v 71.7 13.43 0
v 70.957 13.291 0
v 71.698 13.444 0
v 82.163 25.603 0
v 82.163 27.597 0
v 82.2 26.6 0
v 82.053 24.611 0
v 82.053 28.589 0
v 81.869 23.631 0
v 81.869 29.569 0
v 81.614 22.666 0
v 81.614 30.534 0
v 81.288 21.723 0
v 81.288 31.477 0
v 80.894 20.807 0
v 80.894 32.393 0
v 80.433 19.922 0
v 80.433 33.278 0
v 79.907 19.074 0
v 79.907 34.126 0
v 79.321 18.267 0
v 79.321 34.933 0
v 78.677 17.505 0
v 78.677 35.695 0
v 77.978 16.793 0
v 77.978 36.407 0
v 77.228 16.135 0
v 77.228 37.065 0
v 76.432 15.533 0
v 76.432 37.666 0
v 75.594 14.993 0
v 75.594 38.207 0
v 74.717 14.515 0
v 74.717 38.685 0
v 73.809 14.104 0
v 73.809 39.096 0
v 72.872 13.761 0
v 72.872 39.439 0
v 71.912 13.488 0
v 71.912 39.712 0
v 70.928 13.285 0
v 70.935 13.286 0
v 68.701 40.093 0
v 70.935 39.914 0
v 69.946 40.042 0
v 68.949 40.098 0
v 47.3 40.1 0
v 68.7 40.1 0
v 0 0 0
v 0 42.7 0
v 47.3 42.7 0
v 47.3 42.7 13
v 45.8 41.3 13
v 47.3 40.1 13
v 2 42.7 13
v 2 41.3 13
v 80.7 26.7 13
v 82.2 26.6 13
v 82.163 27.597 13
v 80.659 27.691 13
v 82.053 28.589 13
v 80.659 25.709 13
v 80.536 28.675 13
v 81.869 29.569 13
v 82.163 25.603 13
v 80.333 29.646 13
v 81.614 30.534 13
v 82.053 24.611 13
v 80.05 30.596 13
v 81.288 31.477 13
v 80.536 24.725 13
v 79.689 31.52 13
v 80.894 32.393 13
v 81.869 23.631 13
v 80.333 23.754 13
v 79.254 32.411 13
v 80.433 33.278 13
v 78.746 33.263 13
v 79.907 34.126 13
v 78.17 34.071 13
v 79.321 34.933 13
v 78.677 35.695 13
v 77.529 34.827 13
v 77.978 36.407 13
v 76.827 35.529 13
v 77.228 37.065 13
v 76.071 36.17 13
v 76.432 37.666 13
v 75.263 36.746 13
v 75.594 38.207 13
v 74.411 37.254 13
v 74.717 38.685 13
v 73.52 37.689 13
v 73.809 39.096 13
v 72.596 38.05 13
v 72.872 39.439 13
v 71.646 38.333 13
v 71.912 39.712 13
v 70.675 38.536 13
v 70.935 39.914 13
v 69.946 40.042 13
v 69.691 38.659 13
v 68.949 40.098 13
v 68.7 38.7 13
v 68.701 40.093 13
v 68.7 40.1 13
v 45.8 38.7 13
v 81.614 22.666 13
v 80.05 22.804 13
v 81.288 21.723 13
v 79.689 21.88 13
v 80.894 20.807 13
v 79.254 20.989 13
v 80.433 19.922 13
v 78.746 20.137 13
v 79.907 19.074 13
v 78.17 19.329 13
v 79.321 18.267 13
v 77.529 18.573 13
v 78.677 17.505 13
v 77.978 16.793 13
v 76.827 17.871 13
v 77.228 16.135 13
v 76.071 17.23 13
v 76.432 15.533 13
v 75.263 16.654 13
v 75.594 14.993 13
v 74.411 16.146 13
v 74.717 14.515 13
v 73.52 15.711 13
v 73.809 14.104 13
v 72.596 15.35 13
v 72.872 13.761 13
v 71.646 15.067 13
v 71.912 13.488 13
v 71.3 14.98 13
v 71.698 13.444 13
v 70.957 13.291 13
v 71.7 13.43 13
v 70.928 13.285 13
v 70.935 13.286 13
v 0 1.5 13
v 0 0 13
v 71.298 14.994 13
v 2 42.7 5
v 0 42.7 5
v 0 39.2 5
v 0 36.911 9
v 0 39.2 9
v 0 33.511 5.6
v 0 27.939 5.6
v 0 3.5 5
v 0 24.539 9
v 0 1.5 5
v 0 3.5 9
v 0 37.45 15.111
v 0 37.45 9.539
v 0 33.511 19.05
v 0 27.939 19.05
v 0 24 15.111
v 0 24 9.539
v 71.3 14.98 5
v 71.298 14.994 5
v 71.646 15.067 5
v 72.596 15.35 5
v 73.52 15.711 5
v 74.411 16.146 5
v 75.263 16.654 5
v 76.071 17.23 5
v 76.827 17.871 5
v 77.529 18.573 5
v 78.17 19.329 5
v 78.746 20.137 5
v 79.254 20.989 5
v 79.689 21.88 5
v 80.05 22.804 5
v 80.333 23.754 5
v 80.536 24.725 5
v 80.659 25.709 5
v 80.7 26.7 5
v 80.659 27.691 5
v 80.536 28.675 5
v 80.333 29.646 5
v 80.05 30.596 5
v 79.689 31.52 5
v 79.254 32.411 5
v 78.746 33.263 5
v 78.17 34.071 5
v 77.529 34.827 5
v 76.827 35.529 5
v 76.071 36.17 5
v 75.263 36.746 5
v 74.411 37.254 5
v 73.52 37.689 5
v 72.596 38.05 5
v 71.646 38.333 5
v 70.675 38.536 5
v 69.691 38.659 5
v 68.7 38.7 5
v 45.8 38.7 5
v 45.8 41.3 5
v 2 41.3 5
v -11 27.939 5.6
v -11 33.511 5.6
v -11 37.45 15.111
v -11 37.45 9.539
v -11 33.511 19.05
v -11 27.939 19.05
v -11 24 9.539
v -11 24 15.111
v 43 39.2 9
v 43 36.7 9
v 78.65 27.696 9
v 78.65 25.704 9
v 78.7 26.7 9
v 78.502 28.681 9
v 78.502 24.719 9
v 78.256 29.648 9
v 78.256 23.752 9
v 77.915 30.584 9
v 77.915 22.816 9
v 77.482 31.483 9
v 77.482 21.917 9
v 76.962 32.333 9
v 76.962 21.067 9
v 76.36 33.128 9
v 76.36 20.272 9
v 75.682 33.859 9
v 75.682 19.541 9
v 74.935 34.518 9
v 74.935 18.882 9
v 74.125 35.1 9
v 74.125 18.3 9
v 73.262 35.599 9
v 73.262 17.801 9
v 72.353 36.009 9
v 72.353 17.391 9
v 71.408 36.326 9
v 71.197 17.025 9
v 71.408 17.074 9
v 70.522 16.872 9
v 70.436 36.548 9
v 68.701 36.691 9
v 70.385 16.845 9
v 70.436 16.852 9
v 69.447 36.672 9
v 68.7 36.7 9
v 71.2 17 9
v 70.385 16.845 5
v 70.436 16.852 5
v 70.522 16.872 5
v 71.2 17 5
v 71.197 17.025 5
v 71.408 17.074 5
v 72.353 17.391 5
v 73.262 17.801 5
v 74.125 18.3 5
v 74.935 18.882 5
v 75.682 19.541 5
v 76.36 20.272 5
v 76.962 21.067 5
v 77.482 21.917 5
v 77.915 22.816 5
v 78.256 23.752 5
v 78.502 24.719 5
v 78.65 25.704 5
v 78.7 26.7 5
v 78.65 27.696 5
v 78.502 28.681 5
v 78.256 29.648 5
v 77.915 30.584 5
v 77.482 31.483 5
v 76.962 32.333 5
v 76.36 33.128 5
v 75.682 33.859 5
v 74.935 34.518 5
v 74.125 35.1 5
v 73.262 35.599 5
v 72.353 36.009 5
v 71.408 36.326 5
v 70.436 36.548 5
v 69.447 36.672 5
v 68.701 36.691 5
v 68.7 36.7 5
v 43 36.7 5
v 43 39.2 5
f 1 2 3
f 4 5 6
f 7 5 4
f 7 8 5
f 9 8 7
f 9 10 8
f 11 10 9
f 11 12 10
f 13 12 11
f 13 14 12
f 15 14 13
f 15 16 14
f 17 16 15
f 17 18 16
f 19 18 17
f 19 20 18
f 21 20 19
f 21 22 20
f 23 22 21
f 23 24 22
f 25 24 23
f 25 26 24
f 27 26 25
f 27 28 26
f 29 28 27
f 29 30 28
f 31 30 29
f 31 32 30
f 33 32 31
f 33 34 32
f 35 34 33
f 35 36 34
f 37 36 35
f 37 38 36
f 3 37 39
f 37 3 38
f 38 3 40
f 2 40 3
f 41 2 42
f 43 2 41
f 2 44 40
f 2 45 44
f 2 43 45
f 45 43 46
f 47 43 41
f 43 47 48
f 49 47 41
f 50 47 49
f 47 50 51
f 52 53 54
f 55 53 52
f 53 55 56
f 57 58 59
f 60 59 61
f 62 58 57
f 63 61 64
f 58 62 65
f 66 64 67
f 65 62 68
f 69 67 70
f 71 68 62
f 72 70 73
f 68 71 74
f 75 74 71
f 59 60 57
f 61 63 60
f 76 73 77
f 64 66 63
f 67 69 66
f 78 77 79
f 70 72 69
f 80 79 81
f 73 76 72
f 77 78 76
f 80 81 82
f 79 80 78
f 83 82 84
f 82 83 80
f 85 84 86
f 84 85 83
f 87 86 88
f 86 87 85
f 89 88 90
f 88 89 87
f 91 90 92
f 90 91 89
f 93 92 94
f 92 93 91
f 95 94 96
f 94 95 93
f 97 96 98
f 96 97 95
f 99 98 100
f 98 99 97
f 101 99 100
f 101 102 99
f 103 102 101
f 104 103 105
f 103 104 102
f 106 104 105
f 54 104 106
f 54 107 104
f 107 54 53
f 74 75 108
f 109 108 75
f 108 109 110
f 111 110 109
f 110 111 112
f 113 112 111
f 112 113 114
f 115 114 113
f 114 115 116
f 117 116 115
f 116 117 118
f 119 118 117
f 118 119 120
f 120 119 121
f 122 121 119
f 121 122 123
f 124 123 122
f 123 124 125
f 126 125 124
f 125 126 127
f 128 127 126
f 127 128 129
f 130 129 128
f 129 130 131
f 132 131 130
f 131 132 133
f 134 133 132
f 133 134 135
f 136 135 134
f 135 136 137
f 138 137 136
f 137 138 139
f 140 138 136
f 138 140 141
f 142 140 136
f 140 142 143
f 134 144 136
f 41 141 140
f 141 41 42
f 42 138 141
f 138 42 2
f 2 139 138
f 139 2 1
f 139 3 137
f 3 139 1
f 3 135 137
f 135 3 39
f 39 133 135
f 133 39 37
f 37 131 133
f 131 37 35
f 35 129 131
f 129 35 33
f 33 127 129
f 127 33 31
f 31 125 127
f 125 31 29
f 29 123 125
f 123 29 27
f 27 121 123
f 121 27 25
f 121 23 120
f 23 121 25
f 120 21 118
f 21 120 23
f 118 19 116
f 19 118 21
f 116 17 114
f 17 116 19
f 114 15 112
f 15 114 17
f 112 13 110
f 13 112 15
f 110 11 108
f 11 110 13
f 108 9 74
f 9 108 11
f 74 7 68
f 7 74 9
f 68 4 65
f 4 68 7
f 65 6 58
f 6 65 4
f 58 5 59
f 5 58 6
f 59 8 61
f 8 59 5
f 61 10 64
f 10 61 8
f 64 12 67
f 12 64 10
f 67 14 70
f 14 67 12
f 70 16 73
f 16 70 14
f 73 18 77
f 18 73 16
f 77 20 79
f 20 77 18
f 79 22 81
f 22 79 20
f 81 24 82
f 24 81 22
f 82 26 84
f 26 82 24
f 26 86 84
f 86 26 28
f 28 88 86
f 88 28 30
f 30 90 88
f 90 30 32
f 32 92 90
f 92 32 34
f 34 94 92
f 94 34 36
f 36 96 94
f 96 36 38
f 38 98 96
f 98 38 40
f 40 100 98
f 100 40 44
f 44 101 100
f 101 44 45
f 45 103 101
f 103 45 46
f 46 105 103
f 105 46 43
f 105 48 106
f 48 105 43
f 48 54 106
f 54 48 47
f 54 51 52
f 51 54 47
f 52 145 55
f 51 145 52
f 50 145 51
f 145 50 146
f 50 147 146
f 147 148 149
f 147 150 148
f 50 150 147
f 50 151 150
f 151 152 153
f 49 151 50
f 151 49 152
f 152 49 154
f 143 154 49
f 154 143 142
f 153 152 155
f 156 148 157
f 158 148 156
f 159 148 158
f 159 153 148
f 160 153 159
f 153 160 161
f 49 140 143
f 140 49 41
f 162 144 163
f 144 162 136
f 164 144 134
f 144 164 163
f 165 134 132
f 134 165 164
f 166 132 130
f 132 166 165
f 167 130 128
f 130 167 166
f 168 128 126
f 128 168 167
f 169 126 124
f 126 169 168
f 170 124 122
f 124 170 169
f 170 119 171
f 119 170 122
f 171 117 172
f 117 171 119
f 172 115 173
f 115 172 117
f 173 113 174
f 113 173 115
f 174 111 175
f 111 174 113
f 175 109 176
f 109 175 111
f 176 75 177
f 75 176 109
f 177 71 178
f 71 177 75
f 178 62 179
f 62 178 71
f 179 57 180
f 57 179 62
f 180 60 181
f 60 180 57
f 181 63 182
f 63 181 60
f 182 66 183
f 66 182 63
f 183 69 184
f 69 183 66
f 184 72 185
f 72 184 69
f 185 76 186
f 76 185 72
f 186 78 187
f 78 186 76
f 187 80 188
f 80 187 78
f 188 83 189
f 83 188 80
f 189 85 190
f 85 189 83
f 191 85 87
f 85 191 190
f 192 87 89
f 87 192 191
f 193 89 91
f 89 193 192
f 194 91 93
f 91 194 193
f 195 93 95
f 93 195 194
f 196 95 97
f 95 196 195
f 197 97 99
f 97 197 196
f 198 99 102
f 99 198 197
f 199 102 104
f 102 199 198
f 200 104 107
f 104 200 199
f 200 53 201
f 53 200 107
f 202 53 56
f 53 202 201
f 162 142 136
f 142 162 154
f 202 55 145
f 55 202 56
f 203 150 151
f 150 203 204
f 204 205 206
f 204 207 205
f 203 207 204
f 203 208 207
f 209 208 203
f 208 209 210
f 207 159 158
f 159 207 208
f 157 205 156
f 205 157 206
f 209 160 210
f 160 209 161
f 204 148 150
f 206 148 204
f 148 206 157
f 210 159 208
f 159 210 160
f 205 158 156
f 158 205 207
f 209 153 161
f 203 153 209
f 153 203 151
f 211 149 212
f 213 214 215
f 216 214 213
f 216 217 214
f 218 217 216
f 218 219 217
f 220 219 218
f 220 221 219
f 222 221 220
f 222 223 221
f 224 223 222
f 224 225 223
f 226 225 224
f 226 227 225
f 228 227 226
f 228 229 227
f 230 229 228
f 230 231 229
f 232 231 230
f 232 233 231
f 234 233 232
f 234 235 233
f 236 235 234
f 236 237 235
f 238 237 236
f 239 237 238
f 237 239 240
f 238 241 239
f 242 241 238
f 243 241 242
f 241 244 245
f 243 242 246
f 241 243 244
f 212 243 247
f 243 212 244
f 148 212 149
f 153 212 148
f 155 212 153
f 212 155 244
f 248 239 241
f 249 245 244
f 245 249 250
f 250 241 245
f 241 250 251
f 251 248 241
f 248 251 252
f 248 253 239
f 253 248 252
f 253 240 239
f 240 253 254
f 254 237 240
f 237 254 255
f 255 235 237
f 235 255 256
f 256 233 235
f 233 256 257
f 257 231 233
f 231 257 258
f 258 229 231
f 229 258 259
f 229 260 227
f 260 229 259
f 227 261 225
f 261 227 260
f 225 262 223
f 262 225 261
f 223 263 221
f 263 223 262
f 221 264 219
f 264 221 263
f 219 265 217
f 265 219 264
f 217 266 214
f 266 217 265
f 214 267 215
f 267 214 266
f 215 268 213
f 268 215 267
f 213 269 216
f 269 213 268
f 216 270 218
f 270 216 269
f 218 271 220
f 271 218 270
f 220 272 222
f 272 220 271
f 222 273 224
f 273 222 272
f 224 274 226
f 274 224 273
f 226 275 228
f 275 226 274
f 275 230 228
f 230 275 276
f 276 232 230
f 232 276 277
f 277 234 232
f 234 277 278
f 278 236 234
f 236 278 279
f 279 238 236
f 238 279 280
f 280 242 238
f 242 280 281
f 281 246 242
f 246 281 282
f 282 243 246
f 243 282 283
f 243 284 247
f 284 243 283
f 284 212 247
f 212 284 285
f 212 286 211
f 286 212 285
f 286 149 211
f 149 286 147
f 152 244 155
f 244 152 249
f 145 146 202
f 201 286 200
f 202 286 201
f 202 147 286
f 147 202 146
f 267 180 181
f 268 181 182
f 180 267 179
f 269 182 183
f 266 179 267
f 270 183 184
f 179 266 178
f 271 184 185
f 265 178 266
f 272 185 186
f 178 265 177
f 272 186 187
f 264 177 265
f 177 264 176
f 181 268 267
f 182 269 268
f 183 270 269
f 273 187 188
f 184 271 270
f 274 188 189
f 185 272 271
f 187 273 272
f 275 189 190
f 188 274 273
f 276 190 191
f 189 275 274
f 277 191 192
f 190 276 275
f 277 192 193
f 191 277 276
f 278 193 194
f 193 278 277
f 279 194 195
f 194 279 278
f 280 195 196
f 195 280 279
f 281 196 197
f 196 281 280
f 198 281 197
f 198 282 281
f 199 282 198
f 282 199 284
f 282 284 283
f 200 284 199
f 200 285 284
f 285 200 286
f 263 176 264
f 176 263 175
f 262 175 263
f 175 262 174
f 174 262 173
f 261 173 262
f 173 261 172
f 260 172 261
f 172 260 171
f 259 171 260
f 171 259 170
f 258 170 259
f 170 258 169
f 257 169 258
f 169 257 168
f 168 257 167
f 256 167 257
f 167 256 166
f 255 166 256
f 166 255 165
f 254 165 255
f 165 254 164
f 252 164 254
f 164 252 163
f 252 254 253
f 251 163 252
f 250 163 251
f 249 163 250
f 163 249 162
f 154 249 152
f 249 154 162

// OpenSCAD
// file: multiboard.scad
mb_snap_inner_octagon_width = 13.45;

module hexagon(ri, height) {
    ro = ri/sqrt(3);

    A = [-ro, 0];
    B = [-ro/2, ri/2];
    C = [ro/2, ri/2];
    D = [ro, 0];
    E = [ro/2, -ri/2];
    F = [-ro/2, -ri/2];

    linear_extrude(height=height, center=true) {
        polygon(points=[A, B, C, D, E, F]);
    }
}


module mb_snap_inner_octagon(height) {
    width = mb_snap_inner_octagon_width;

    intersection() {
        cube([width, width, height], center=true);

        rotate([0,0,45]) {
            cube([width, width, height], center=true);
        }
    }
}
// main file
include <multiboard.scad>

$fa = 1;
$fs = 1;

// --- CONFIGURATION START ---
// height and position of multiboard snap
snap_height = 11;
snap_pos_y = 24;
snap_pos_z = 5.6;

// default right adapter
left_adapter = 0;
// --- CONFIGURATION END ---

height = 6;
outer_wall_thickness = 1.5;
inner_wall_cutout_thickness = 2;

// inner
inner_thick_end_d = 35.7;
inner_step_l = 43;
inner_step_d = 2.5;
inner_offset_0 = 8.35;

inner_r = 10;
inner_l = 78.7;

inset_h = 4;
bottom_wall_h = 5;

inner_h = bottom_wall_h+inset_h;

inner_shape_offset_y = outer_wall_thickness+inner_wall_cutout_thickness;

// mid
mid_thick_end_d = 39.8;
mid_step_l = 45.8;
mid_step_d = 2.6;

mid_r = 12;

// outer 
outer_thick_end_d = inner_thick_end_d+2*outer_wall_thickness+2*inner_wall_cutout_thickness;
outer_length = 82;
outer_h = bottom_wall_h+8;
outer_step_l = mid_step_l+outer_wall_thickness;

outer_r = mid_r+outer_wall_thickness;

outer_polygon_points = [
    [0,0], 
    [0,outer_thick_end_d], 
    [outer_step_l,outer_thick_end_d], 
    [outer_step_l,outer_thick_end_d-mid_step_d], 
    [inner_l-inner_r,outer_thick_end_d-mid_step_d], 
    [inner_l-inner_r+3,outer_thick_end_d-mid_step_d-2*outer_r+0.33]
];


mirror([left_adapter,0,0]) {
    // inner shape
    translate([0,inner_shape_offset_y,(inner_h)/2]) {
        linear_extrude(height=inner_h, center=true) {
            union() {
                polygon([
                    [0,0],
                    [0,inner_thick_end_d],
                    [inner_step_l,inner_thick_end_d],
                    [inner_step_l,inner_thick_end_d-inner_step_d],
                    [inner_l-inner_r,inner_thick_end_d-inner_step_d],
                    [inner_l-inner_r+2.5,inner_thick_end_d-inner_step_d-2*inner_r+0.3]
                ]);

                translate([inner_l-inner_r,inner_thick_end_d-inner_step_d-inner_r,0]) {
                    circle(inner_r);
                }
            }
        }
    }

    difference() {
        // outer shape
        translate([0,0,outer_h/2]) {
            linear_extrude(height=outer_h, center=true) {
                union() {
                    polygon(outer_polygon_points);

                    translate([inner_l-inner_r,outer_thick_end_d-mid_step_d-outer_r,0]) {
                        circle(outer_r);
                    }
                }
            }
        }

        // mid shape
        translate([0,outer_wall_thickness,8]) {
            linear_extrude(height=20, center=true) {
                union() {
                    polygon([
                        [0,0], 
                        [0, mid_thick_end_d],
                        [mid_step_l,mid_thick_end_d],
                        [mid_step_l,mid_thick_end_d-mid_step_d],
                        [mid_step_l,mid_thick_end_d-mid_step_d],
                        [inner_l-inner_r,mid_thick_end_d-mid_step_d],
                        [inner_l-inner_r+2.6,mid_thick_end_d-mid_step_d-2*mid_r+0.28]
                    ]);

                    translate([inner_l-inner_r,mid_thick_end_d-mid_step_d-mid_r,0]) {
                        circle(mid_r);
                    }
                }
            }
        }

        // latch cutout
        translate([2/2,4/2+mid_thick_end_d,0])
        cube([2,4,40], center=true);
    }

    // bottom wall
    translate([0,0,bottom_wall_h/2]) {
        linear_extrude(height=bottom_wall_h, center=true) {
            union() {
                polygon(outer_polygon_points);

                translate([inner_l-inner_r,outer_thick_end_d-mid_step_d-outer_r,0]) {
                    circle(outer_r);
                }
            }
        }
    }
    translate([-snap_height/2, mb_snap_inner_octagon_width/2+snap_pos_y, mb_snap_inner_octagon_width/2+snap_pos_z]) {
        rotate([0,90,0]) {
            mb_snap_inner_octagon(snap_height);
        }
    }
}
